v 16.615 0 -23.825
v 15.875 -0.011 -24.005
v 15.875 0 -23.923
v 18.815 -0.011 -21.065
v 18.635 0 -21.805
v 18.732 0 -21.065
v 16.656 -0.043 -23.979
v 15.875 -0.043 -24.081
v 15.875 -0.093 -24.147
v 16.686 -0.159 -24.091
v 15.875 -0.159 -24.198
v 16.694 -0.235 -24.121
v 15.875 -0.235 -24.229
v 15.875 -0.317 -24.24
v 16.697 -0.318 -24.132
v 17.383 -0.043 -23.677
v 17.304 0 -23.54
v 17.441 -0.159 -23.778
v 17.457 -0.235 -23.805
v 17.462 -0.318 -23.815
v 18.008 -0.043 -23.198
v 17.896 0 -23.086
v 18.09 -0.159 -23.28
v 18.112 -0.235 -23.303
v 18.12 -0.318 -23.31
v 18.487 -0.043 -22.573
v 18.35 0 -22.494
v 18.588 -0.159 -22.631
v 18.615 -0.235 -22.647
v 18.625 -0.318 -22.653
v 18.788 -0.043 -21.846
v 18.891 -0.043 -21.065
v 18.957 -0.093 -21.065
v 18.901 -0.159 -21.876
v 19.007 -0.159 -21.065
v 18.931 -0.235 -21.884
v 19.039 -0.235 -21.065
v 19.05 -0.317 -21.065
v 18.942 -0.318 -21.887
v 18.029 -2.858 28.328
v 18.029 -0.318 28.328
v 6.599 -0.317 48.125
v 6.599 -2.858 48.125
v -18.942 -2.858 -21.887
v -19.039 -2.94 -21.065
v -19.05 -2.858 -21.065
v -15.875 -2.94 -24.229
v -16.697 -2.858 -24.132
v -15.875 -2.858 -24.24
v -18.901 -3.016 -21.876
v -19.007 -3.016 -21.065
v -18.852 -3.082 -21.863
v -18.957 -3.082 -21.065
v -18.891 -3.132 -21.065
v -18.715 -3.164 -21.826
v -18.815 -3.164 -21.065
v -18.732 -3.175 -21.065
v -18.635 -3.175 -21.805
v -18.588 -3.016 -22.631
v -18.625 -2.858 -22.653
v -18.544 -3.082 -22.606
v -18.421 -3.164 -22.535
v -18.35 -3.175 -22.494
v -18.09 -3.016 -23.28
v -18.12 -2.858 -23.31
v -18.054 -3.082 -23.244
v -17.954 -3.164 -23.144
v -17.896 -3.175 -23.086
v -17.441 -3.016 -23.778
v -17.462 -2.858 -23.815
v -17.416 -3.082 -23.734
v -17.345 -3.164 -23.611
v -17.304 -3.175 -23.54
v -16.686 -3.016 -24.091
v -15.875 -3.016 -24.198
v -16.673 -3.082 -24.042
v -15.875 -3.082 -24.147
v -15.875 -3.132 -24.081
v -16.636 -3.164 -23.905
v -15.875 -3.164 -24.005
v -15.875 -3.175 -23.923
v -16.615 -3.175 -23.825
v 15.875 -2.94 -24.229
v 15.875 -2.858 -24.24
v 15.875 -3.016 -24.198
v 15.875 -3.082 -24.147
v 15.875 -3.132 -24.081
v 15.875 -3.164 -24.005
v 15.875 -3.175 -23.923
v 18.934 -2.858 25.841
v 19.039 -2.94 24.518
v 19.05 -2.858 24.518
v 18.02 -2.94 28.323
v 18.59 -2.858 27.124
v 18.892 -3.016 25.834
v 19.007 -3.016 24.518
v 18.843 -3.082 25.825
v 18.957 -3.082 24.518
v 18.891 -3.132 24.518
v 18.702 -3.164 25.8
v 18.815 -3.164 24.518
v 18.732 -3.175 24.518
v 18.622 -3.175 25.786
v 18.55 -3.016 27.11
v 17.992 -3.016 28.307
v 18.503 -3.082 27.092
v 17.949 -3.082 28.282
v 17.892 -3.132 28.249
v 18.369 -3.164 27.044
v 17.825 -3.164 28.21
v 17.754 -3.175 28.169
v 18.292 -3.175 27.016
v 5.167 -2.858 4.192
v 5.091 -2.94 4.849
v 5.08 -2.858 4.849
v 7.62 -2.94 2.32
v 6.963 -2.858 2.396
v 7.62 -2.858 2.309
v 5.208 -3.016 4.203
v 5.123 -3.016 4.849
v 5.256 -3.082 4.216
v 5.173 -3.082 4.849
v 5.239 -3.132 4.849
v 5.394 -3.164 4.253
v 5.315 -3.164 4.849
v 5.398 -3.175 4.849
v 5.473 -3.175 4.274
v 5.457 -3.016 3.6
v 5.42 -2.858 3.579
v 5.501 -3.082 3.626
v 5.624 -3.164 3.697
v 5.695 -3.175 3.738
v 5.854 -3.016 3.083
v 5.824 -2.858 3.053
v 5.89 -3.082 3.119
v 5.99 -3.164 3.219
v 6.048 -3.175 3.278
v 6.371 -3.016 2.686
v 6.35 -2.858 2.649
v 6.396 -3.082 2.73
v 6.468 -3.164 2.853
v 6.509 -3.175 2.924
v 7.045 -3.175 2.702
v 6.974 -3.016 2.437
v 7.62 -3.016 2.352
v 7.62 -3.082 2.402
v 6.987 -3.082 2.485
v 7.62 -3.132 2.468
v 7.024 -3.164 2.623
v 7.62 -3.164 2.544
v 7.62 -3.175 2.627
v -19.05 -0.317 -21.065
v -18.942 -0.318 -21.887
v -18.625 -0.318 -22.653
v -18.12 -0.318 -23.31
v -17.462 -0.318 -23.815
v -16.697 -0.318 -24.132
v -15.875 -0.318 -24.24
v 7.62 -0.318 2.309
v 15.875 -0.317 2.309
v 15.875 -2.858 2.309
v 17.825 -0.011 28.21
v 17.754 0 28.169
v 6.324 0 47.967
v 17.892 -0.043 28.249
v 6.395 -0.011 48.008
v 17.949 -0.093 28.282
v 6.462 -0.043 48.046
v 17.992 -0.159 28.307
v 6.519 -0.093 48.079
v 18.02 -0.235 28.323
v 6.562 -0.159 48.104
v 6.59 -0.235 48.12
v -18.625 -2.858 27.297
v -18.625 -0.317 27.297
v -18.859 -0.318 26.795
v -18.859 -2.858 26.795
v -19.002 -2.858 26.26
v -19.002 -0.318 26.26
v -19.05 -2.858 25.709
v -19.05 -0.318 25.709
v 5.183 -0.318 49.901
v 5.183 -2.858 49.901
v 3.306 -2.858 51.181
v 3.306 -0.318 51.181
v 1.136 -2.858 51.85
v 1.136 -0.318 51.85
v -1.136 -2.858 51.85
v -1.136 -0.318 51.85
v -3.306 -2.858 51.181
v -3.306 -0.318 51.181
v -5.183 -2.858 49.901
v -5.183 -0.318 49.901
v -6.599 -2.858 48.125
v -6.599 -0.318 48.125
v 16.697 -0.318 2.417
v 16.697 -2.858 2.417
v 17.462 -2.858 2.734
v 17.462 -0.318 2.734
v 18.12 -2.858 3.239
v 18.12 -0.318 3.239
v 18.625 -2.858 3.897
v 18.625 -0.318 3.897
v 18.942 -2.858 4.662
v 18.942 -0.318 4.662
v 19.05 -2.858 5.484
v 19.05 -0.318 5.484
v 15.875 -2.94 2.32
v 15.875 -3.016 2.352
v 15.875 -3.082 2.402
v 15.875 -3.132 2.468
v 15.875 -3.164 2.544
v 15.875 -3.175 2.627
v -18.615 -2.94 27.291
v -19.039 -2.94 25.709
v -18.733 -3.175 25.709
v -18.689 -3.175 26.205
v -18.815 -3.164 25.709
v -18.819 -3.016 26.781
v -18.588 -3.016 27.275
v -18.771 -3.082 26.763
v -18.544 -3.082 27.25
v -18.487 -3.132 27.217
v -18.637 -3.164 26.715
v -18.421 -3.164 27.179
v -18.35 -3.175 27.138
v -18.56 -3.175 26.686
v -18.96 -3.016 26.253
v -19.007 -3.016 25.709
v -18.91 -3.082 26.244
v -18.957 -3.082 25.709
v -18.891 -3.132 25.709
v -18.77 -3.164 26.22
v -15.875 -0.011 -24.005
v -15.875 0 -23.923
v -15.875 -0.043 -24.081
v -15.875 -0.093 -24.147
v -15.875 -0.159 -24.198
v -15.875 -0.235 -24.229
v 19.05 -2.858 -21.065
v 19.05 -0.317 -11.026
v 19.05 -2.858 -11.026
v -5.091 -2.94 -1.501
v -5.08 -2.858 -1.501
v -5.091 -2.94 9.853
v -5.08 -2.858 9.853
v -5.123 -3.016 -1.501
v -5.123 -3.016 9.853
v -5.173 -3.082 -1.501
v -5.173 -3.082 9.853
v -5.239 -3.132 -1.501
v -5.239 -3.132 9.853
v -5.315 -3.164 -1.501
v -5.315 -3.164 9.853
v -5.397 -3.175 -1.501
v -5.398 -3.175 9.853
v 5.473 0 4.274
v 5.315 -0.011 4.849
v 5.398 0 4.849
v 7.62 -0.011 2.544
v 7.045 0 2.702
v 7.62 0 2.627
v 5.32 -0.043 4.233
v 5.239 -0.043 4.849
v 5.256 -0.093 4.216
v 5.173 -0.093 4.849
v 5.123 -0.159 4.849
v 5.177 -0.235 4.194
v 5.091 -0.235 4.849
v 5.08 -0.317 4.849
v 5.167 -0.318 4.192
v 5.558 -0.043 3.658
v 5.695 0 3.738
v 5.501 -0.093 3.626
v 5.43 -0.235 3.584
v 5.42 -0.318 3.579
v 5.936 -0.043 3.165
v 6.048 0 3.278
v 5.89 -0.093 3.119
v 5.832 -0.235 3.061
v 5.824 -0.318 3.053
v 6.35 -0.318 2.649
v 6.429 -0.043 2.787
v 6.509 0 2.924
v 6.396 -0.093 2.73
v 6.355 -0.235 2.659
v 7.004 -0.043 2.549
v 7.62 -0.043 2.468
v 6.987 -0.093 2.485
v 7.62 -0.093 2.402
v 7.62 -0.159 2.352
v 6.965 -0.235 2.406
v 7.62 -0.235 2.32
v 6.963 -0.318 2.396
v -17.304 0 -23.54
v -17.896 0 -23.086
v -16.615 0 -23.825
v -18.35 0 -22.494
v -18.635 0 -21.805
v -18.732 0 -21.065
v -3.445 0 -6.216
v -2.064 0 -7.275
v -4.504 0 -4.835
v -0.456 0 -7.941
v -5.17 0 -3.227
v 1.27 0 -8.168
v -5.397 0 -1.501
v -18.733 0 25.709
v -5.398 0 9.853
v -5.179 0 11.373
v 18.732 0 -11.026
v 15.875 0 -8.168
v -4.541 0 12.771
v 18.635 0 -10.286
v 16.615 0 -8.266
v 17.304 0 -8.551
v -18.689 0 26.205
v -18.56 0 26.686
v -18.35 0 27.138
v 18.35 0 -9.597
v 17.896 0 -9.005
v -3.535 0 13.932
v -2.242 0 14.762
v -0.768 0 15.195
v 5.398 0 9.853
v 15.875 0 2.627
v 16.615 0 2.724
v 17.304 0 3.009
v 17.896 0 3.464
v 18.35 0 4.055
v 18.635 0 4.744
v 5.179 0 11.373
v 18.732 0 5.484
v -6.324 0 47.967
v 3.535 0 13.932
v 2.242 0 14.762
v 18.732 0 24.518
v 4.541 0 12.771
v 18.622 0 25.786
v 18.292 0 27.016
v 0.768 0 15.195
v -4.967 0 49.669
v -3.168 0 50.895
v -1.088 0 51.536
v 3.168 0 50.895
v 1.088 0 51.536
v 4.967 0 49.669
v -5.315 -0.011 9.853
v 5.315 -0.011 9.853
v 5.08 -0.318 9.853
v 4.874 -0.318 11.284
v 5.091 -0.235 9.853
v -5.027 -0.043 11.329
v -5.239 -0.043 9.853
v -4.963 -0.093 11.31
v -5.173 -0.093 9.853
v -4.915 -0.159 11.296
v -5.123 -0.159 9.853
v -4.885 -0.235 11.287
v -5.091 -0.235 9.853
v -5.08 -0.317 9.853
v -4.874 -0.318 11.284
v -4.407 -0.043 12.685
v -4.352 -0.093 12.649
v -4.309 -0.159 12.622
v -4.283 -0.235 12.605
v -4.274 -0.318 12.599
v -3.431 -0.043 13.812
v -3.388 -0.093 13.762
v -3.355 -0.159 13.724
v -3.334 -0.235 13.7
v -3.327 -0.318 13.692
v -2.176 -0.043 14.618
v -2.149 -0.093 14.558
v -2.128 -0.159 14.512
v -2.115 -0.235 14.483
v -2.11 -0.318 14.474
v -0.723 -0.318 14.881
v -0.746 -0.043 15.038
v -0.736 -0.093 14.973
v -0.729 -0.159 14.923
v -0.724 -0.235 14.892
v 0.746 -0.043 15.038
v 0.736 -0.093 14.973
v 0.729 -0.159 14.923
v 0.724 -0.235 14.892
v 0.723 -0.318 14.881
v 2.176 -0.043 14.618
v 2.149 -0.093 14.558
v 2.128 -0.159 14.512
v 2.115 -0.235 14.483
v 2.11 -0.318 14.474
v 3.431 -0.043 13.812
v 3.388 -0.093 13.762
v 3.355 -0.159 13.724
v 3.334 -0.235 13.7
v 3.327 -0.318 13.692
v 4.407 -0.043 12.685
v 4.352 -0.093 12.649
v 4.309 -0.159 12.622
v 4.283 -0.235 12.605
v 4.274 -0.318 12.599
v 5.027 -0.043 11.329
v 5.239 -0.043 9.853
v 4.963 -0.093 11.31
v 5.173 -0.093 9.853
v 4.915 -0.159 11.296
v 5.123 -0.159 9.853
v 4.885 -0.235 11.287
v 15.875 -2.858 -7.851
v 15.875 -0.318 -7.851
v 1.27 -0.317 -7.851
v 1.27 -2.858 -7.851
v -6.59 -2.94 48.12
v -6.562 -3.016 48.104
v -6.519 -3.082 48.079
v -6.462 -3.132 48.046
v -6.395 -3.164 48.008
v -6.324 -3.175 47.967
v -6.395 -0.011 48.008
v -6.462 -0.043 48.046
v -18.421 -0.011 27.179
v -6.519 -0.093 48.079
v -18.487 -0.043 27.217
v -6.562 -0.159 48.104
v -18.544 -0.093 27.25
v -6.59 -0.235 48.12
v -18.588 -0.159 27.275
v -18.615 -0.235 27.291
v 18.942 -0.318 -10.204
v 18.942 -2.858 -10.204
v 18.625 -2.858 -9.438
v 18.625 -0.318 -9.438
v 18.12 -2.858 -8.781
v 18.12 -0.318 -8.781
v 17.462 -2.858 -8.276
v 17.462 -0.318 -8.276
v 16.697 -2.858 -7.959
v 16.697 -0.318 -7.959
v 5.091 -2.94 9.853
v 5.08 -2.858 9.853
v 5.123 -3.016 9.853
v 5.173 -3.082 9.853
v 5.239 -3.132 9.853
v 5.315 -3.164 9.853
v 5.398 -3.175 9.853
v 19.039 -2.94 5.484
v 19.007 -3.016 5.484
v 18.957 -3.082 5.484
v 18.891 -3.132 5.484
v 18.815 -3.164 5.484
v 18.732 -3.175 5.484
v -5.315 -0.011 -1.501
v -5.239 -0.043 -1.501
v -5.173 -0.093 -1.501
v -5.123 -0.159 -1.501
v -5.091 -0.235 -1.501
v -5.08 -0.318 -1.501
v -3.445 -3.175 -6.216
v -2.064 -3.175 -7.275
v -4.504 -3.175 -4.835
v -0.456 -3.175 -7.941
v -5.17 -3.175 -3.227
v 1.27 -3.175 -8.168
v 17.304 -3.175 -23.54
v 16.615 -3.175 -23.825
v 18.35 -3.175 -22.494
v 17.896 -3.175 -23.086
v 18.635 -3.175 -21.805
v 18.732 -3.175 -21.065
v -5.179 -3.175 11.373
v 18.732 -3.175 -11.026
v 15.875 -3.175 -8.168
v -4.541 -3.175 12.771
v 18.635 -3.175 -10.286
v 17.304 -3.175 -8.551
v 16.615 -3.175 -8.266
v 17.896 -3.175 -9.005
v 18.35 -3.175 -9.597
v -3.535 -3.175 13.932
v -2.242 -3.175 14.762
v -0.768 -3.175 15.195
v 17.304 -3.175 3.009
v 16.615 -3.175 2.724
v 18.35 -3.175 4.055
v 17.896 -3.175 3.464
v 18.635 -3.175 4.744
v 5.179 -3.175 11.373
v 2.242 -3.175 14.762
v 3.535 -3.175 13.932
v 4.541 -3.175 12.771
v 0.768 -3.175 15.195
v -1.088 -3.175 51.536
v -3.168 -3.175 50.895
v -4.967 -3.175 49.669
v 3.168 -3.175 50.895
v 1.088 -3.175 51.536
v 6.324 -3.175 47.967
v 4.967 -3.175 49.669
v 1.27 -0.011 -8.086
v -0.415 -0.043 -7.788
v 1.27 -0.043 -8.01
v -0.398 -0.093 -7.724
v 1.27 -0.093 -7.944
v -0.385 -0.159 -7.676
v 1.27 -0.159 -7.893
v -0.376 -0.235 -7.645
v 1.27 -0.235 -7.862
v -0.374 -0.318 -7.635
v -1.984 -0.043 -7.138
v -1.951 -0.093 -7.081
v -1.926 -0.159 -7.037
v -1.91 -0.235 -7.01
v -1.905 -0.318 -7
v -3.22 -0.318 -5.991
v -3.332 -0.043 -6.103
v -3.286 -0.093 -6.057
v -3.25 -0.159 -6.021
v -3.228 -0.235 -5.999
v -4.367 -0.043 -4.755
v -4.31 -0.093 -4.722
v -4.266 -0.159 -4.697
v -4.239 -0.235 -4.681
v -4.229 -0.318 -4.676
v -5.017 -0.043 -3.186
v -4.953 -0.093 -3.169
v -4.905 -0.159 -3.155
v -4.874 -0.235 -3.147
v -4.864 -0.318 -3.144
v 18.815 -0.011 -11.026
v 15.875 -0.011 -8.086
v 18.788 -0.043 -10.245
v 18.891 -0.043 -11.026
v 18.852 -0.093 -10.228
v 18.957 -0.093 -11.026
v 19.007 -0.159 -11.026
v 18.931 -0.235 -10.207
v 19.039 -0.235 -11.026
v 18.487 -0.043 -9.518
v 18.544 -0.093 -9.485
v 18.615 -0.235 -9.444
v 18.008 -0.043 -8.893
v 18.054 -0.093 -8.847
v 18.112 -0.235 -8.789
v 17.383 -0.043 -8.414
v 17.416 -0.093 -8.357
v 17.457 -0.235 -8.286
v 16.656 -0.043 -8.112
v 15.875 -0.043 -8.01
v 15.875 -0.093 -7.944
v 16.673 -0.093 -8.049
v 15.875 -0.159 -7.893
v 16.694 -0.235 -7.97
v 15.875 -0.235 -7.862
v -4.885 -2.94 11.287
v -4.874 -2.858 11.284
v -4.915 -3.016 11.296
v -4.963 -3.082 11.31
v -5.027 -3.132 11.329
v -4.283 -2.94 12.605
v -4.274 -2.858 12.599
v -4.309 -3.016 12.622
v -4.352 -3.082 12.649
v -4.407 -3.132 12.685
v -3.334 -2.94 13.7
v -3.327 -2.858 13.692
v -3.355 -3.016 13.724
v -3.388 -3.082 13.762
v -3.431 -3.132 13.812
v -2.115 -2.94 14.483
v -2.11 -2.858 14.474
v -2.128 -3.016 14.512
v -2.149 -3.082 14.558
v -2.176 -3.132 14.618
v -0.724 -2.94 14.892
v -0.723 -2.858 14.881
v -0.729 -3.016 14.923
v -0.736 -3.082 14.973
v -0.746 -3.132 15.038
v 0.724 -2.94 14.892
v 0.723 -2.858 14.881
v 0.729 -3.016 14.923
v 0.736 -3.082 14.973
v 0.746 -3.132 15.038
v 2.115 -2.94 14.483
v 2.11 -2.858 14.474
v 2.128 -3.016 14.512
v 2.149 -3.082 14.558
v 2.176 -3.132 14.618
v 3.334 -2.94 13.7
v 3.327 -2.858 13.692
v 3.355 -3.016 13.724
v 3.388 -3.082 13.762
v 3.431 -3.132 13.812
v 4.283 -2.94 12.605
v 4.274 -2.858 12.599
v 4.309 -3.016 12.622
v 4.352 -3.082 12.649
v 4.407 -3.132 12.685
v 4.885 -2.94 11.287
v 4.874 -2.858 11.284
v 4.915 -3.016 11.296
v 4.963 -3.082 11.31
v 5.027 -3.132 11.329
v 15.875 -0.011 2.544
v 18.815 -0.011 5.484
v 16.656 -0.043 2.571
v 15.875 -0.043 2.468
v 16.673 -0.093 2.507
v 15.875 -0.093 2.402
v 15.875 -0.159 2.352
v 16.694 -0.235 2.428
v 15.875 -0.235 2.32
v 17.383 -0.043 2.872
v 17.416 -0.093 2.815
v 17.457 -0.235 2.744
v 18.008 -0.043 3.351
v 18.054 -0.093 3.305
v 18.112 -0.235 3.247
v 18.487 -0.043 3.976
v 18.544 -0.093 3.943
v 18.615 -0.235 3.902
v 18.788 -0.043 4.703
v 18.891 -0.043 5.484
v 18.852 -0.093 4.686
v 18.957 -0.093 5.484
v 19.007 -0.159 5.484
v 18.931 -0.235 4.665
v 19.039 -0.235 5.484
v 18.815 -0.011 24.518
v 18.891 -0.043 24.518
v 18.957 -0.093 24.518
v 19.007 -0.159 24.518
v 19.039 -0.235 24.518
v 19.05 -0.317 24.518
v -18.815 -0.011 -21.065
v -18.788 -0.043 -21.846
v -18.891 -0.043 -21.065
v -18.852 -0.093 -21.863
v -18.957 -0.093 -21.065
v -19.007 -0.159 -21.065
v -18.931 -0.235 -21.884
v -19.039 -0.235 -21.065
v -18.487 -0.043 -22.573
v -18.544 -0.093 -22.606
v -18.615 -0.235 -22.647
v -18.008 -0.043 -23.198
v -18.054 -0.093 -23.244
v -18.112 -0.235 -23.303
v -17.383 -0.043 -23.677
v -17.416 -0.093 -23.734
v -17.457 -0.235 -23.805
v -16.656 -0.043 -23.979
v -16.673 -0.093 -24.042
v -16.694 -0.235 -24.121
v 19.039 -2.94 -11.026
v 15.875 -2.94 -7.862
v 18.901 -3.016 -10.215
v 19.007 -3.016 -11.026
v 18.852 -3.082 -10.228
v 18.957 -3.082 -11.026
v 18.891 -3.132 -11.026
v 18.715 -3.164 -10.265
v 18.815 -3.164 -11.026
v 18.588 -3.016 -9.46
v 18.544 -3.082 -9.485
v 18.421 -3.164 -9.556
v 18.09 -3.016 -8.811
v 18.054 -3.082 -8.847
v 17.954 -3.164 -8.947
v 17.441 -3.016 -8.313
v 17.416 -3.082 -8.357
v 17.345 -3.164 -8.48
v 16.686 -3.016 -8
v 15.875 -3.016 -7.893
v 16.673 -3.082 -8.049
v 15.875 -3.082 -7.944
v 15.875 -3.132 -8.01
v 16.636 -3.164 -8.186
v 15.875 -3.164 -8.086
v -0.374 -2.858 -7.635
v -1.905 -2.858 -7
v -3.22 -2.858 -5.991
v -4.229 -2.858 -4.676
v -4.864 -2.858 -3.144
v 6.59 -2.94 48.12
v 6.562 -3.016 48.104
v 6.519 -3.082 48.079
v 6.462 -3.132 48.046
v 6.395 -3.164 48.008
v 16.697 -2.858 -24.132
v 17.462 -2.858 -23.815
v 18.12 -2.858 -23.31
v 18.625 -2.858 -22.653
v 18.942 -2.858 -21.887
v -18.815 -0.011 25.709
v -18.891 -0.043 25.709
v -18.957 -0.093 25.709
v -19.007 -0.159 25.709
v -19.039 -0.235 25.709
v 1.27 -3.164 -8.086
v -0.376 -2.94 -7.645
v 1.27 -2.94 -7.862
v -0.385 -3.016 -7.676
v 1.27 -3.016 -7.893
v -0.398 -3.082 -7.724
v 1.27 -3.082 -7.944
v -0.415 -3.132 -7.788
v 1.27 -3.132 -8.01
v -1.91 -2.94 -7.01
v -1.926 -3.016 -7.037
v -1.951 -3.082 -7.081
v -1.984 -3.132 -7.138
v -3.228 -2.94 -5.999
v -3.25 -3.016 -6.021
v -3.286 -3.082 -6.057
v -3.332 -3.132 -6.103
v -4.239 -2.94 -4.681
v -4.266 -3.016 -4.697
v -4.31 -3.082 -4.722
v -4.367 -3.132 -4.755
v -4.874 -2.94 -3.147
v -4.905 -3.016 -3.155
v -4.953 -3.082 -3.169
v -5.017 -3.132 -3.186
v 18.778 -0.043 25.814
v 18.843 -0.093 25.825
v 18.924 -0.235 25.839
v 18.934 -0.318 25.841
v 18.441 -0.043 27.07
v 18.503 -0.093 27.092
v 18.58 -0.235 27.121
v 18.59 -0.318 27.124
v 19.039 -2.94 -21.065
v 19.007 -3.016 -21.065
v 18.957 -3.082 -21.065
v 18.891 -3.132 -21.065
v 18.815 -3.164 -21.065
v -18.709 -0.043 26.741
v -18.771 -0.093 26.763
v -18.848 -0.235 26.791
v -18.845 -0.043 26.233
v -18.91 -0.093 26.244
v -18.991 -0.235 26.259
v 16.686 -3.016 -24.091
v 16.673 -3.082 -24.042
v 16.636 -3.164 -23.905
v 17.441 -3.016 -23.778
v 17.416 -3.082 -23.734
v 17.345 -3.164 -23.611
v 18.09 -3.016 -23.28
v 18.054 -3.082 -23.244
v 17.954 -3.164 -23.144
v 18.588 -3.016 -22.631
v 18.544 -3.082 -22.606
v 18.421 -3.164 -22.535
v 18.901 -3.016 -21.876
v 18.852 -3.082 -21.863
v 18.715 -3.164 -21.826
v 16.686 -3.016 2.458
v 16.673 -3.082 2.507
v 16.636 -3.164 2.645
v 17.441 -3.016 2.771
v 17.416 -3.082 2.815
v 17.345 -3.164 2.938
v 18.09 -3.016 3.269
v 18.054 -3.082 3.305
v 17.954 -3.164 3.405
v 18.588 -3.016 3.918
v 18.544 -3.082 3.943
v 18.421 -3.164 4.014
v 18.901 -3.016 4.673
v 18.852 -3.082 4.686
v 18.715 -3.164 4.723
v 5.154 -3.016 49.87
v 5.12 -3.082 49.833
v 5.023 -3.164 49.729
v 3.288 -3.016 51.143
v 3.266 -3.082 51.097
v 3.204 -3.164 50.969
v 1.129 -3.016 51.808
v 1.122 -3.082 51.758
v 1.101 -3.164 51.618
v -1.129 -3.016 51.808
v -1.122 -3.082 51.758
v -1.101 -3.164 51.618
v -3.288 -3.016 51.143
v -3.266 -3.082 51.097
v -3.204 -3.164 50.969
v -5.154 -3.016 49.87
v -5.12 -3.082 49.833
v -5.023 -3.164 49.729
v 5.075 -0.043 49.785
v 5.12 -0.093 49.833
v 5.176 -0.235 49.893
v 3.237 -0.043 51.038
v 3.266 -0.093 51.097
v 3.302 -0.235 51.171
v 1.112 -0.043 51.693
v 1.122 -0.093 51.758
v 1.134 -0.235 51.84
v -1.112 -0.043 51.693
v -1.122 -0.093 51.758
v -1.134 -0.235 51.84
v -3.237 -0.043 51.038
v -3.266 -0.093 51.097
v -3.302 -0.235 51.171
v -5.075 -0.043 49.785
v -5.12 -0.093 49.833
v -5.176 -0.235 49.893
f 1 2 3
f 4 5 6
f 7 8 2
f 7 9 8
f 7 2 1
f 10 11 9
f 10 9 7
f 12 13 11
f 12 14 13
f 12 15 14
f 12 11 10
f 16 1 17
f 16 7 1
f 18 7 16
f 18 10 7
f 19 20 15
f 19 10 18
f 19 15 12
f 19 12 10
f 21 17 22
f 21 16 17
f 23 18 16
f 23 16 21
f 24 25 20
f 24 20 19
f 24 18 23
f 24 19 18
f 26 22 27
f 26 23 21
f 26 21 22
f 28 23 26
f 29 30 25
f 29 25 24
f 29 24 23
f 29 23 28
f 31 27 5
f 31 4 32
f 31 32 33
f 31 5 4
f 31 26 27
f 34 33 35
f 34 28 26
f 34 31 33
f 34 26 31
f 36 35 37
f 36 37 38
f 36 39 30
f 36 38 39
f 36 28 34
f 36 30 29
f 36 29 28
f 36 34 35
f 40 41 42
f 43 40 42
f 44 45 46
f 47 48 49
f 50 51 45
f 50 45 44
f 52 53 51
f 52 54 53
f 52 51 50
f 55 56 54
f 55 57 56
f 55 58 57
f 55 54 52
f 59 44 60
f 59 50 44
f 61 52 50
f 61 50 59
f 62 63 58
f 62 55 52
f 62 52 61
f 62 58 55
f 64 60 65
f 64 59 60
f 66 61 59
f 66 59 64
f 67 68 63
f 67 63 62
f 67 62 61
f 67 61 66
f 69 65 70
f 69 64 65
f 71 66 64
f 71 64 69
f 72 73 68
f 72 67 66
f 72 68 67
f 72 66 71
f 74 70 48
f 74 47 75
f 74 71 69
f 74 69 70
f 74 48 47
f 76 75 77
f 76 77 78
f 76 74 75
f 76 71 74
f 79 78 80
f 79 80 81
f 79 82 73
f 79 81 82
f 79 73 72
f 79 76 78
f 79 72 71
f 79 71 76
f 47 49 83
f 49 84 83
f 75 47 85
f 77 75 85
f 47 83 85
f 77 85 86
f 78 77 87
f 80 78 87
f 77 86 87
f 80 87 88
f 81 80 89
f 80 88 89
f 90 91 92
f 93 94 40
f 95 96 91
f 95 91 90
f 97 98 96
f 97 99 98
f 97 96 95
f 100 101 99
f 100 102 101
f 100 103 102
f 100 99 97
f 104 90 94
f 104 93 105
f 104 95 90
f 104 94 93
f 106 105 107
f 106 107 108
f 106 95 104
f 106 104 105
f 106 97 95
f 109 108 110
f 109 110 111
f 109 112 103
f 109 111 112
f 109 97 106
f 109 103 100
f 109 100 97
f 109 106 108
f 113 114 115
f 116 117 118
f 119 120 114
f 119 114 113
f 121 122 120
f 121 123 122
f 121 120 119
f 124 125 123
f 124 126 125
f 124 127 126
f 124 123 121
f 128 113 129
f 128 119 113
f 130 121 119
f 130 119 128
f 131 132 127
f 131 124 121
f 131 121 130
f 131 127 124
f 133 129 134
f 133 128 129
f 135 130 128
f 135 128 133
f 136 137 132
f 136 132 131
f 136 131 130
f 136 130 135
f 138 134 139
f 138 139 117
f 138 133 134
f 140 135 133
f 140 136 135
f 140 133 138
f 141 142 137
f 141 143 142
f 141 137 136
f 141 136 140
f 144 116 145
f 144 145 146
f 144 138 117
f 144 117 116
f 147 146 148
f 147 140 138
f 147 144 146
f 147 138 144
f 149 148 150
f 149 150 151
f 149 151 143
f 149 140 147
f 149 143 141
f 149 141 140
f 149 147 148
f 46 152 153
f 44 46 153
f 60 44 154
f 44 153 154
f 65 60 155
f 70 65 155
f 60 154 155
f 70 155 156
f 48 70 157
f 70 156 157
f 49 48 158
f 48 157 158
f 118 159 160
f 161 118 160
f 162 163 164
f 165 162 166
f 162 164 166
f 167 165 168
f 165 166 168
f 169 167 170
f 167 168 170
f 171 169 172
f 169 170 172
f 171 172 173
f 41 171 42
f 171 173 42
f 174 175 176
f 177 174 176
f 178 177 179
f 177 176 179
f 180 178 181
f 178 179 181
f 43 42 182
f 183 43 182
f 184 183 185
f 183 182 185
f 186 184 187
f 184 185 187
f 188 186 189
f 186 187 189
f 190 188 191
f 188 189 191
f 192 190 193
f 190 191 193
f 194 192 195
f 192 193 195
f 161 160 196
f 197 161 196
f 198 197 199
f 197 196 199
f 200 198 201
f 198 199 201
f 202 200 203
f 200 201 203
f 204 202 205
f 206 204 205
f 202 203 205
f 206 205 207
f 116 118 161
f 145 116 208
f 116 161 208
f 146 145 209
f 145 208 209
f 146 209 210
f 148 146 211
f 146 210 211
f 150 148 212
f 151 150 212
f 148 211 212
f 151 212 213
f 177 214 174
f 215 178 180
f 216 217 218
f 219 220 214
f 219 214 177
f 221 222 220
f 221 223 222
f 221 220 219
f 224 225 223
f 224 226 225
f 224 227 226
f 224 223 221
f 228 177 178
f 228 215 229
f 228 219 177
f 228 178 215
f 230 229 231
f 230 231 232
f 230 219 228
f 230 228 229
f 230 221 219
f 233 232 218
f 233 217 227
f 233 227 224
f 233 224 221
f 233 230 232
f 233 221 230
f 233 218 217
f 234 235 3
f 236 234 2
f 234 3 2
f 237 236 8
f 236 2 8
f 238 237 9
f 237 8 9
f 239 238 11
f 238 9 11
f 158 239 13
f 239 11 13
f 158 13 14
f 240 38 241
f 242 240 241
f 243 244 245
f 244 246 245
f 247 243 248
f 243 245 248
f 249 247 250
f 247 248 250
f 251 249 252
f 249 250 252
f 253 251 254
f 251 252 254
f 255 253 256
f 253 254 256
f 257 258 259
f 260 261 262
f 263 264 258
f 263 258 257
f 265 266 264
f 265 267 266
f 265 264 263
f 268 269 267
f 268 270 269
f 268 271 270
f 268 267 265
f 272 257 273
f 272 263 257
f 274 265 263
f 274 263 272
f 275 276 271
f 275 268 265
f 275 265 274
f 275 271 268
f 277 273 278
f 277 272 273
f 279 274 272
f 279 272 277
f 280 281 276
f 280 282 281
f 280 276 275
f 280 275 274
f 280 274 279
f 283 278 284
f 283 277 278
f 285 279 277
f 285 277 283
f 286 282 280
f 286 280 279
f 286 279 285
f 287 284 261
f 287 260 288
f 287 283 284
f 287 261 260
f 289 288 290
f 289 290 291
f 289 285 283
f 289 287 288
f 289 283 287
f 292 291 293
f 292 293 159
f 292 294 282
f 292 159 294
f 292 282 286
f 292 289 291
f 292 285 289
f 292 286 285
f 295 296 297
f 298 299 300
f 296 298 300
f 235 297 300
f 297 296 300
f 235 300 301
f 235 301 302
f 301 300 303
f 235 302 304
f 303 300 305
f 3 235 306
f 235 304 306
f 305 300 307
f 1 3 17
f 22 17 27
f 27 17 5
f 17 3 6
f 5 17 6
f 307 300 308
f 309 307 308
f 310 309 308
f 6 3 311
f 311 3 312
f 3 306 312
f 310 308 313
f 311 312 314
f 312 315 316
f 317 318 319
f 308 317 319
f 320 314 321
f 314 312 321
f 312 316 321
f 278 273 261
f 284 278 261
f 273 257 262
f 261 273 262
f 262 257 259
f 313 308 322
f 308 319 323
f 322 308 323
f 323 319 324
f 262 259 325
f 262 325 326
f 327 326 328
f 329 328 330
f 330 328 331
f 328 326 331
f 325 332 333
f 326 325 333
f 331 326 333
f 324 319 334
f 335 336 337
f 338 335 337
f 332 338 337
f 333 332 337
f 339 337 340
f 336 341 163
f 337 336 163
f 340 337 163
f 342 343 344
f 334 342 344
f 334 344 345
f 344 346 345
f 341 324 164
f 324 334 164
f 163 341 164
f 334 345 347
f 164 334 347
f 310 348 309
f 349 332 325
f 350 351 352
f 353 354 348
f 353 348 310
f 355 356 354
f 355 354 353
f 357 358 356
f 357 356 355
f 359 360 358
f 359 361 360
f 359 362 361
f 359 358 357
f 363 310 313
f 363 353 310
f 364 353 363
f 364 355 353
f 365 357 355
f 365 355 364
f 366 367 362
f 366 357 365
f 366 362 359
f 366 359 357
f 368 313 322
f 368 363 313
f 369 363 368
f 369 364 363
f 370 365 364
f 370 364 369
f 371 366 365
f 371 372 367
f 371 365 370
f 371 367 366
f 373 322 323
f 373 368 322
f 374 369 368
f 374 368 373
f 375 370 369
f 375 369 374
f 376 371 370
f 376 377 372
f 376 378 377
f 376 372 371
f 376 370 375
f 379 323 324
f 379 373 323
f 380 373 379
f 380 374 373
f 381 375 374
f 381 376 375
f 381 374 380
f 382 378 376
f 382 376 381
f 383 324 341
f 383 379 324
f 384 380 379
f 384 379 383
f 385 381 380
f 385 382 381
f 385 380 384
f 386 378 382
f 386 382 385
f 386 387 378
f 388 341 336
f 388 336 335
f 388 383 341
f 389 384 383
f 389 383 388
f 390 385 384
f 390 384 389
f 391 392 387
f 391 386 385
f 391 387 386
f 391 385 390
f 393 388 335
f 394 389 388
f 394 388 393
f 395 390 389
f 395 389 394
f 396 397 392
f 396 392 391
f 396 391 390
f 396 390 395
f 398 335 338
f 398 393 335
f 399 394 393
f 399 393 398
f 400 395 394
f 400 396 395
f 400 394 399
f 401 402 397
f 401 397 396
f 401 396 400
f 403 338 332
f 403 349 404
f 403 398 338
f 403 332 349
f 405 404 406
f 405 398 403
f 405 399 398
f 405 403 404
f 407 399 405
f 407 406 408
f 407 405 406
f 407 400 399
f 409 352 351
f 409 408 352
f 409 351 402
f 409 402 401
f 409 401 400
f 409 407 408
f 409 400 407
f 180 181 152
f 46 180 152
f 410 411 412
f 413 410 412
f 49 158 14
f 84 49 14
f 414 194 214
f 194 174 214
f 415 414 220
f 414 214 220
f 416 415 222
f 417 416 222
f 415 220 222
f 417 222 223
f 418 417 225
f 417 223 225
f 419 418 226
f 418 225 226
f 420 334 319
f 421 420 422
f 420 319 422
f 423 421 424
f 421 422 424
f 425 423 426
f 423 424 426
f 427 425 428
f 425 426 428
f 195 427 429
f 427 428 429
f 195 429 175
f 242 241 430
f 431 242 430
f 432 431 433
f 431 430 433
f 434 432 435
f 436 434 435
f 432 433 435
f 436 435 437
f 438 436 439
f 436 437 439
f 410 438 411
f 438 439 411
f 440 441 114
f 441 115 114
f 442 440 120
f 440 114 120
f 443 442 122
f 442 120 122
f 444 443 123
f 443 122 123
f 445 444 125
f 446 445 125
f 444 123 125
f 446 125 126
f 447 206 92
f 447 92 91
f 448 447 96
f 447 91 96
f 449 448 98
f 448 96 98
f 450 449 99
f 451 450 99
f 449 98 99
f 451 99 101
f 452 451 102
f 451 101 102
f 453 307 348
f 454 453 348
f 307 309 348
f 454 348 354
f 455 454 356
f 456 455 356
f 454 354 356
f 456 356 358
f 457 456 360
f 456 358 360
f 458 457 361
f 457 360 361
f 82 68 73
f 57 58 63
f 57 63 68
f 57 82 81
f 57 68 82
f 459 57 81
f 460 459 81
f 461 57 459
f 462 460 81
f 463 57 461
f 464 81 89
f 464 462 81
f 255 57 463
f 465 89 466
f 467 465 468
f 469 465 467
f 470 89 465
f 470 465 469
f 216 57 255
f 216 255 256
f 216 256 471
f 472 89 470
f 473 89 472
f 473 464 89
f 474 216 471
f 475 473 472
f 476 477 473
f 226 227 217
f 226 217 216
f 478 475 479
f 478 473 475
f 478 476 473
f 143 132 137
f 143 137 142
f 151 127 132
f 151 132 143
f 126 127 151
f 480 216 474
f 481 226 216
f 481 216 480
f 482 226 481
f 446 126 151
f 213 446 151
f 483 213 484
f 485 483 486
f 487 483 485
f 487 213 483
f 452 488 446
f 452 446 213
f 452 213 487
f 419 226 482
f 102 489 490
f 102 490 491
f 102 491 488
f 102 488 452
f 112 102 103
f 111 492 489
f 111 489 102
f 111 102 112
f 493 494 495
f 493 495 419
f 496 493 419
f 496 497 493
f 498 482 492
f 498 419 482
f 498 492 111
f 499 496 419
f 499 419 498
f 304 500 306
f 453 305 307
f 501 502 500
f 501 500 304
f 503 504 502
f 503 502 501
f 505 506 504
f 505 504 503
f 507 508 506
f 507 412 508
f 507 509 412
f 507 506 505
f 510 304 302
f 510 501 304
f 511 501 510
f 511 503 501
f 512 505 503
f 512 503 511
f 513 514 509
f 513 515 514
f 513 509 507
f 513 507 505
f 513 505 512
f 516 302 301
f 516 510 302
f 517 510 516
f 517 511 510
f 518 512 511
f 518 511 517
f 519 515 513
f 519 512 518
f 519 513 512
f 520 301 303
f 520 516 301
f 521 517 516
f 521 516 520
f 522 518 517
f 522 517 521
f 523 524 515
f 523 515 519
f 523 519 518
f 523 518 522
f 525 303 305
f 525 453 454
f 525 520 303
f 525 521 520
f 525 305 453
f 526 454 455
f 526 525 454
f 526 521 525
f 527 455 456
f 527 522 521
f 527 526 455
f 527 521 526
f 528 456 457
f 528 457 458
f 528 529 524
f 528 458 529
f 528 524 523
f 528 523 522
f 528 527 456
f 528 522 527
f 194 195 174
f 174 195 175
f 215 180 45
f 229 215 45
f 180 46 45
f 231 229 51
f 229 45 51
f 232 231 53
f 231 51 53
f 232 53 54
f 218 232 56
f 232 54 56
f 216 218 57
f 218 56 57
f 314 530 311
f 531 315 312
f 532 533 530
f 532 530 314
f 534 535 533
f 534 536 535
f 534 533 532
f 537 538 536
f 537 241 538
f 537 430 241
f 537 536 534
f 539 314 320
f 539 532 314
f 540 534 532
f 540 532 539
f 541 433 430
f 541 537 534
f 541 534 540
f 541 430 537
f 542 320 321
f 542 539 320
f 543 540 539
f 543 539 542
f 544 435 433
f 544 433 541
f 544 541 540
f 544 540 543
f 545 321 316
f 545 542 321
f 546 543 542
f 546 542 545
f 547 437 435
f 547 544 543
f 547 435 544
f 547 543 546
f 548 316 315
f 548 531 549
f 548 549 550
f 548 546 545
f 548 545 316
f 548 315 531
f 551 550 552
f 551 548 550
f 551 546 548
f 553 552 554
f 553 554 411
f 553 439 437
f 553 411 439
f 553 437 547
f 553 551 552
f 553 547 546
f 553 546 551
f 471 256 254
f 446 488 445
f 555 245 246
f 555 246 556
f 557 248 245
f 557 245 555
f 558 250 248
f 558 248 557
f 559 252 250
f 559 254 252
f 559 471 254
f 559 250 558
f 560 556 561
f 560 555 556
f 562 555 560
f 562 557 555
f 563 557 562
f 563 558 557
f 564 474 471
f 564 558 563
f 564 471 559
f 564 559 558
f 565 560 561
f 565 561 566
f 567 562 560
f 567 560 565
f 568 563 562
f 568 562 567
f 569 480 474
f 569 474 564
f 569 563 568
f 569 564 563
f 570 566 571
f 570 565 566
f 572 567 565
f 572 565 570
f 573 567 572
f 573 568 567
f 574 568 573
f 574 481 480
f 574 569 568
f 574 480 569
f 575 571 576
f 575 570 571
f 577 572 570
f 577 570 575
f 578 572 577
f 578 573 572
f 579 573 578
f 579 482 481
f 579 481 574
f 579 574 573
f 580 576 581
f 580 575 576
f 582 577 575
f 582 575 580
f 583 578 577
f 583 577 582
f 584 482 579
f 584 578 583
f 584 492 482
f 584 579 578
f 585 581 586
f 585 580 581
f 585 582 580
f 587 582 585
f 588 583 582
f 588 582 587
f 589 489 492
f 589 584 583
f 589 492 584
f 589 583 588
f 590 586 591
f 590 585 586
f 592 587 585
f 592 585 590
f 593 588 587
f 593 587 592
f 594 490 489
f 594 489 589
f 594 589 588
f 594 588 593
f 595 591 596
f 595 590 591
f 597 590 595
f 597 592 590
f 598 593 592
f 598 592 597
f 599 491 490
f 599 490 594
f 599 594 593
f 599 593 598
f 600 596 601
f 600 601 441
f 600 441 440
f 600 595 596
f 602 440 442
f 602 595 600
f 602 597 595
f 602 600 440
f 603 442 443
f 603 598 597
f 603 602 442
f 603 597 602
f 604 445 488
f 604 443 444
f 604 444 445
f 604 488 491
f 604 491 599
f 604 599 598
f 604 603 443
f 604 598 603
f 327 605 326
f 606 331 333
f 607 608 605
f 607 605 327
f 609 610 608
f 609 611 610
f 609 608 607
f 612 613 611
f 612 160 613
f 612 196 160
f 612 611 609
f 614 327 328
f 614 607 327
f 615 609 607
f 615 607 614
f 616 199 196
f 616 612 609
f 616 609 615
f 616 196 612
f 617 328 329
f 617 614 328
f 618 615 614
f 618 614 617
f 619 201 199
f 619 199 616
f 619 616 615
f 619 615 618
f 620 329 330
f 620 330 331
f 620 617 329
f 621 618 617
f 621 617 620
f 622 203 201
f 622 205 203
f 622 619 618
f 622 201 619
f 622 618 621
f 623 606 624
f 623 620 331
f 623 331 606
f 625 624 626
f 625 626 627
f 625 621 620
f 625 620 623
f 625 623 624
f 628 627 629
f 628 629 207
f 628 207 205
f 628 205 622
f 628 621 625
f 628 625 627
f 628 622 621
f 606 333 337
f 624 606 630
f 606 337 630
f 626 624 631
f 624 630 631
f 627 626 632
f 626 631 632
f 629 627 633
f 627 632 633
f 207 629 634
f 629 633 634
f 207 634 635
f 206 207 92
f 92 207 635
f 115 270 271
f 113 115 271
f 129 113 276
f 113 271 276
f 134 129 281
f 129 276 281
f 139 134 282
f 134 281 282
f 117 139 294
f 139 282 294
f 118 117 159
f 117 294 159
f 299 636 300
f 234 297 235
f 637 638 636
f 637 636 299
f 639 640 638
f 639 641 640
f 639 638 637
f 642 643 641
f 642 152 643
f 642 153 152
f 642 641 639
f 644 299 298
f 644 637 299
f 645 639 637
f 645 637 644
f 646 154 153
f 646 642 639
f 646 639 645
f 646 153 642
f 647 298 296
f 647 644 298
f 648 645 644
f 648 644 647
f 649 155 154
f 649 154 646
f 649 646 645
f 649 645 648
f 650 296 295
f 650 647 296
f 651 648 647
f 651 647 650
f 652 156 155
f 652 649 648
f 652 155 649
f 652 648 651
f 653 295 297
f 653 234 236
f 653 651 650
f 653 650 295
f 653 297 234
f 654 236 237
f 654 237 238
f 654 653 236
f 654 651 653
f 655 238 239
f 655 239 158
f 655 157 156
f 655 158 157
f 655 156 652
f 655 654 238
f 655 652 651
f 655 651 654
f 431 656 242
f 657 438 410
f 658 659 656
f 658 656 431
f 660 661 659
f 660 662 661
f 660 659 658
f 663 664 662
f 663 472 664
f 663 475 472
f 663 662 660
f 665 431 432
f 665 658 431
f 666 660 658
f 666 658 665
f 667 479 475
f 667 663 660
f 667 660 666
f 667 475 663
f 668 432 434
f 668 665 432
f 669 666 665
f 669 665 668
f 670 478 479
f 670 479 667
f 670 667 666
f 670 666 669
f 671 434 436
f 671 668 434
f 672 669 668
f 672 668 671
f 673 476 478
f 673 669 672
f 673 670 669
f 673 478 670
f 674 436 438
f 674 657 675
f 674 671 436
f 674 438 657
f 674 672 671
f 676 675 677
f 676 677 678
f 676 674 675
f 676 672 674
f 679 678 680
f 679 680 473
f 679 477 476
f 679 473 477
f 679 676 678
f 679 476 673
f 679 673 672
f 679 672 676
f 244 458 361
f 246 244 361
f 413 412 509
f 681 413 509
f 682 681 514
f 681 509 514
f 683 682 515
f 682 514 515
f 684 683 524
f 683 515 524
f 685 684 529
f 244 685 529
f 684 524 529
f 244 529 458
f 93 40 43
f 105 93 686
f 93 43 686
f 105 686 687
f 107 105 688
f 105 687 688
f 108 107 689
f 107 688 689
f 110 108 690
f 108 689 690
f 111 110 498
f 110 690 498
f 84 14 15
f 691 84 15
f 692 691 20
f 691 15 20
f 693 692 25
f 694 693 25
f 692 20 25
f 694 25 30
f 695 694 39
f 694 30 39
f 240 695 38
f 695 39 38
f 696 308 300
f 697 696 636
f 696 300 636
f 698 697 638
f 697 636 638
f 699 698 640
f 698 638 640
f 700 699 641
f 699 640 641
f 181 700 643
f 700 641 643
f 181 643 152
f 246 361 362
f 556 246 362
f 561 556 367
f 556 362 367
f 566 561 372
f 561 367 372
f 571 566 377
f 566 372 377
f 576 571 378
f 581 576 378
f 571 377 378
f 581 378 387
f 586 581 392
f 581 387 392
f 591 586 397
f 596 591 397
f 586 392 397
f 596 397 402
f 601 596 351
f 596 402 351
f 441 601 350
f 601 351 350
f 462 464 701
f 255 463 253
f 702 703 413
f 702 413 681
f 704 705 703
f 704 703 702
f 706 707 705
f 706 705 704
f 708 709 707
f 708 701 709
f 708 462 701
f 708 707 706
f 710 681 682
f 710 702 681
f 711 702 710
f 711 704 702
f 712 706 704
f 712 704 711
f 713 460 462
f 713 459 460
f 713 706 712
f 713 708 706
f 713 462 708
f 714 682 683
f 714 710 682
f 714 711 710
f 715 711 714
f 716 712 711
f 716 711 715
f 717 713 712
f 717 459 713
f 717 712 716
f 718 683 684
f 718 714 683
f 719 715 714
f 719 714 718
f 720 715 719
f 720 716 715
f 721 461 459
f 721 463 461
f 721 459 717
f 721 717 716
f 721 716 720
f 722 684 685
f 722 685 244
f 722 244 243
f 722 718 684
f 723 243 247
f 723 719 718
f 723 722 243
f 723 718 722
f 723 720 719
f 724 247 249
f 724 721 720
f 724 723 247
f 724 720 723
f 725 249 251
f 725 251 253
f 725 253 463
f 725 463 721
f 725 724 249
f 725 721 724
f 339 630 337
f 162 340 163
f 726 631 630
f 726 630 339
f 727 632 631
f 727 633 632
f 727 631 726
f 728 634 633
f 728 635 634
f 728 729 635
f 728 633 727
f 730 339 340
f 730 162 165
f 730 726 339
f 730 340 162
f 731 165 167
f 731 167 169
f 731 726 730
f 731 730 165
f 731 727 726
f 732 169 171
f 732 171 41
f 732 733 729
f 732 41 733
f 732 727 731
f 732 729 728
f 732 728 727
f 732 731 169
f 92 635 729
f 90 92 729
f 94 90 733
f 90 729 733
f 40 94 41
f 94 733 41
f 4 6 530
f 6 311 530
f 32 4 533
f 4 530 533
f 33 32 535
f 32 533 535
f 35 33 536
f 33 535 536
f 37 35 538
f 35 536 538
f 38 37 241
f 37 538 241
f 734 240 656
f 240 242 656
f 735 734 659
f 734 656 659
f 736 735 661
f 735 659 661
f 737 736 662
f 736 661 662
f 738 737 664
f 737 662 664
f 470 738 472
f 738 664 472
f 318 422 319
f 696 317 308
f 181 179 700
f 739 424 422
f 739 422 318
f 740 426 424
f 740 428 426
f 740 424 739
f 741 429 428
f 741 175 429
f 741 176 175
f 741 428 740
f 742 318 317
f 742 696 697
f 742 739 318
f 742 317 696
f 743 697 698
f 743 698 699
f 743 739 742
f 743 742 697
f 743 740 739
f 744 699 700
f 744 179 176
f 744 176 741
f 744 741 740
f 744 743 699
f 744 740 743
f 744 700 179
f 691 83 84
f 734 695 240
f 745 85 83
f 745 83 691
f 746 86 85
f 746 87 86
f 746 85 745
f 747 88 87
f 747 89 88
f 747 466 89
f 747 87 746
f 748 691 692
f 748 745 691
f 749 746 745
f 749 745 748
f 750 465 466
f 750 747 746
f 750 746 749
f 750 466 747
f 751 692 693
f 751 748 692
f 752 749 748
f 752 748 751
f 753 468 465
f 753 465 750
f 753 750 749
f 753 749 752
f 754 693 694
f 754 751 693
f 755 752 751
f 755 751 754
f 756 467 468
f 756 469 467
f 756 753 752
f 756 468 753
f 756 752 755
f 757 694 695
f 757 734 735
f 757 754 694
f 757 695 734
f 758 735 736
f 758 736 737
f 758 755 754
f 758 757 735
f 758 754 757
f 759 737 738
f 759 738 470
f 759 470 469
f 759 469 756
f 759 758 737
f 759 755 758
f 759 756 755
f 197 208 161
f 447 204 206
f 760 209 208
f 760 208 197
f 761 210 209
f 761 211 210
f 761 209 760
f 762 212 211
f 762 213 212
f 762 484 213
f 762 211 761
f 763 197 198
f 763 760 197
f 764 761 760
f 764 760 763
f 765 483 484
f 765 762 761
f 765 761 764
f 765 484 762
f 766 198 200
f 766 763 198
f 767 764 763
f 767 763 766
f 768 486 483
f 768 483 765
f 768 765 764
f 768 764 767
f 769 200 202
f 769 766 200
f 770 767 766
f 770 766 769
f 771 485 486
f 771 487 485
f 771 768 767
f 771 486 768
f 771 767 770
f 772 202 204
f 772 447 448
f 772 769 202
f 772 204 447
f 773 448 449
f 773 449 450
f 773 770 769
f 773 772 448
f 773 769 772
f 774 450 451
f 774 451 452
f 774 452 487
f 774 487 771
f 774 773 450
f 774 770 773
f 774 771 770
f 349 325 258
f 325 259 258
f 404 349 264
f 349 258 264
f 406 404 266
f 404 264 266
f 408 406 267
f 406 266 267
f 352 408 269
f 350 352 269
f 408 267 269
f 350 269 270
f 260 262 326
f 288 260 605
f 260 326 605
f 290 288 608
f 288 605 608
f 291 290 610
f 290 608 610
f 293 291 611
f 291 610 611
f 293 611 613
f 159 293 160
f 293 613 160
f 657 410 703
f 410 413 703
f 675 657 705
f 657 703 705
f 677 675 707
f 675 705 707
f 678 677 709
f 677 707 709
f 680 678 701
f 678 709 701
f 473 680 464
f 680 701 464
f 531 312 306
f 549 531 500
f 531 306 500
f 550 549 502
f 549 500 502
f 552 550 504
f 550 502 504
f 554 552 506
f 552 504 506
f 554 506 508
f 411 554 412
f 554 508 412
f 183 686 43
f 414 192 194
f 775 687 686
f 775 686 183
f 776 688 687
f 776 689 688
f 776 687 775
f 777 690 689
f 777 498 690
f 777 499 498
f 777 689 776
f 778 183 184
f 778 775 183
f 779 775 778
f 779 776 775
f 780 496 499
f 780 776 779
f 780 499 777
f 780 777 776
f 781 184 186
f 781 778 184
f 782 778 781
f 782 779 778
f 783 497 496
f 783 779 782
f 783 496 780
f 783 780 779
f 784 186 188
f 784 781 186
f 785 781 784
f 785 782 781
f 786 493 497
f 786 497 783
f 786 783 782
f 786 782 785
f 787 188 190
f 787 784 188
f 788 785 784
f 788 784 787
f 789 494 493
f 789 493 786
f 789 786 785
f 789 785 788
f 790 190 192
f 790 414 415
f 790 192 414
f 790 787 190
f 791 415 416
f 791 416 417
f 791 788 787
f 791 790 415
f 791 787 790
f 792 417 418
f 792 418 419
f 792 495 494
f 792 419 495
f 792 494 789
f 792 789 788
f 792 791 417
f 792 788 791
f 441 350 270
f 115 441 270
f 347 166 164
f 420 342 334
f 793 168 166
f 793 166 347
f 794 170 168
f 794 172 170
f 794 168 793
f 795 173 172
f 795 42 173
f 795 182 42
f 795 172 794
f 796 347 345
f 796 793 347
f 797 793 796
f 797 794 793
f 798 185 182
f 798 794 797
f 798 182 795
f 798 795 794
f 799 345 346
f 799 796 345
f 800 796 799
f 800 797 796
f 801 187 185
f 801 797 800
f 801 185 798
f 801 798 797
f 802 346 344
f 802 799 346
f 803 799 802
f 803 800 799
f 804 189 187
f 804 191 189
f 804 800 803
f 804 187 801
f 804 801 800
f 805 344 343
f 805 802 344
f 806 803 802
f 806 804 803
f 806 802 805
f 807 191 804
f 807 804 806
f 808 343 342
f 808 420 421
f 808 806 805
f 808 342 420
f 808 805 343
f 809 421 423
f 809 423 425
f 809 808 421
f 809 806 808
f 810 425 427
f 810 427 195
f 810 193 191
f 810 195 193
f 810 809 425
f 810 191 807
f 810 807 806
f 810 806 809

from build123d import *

# Parameters (mm, degrees)
F1_DEPTH = 3.175
F2_R     = 0.3175
F3_R     = 0.3175


with BuildPart() as f1:
    # F0 (on Front) → F1 (new body)
    with BuildSketch(Plane.XZ):
        with BuildLine():
            ThreePointArc((-19.05, -21.065116), (-18.120064, -23.31018), (-15.875, -24.240116))
            Line((-15.875, -24.240116), (15.875, -24.240116))
            ThreePointArc((15.875, -24.240116), (18.120064, -23.31018), (19.05, -21.065116))
            Line((19.05, -21.065116), (19.05, -11.025942))
            ThreePointArc((19.05, -11.025942), (18.120064, -8.780878), (15.875, -7.850942))
            Line((15.875, -7.850942), (1.27, -7.850942))
            ThreePointArc((1.27, -7.850942), (-3.220128, -5.99107), (-5.08, -1.500942))
            Line((-5.08, -1.500942), (-5.08, 9.852602))
            ThreePointArc((-5.08, 9.852602), (0, 14.932602), (5.08, 9.852602))
            Line((5.08, 9.852602), (5.08, 4.849058))
            ThreePointArc((5.08, 4.849058), (5.823949, 3.053007), (7.62, 2.309058))
            Line((7.62, 2.309058), (15.875, 2.309058))
            ThreePointArc((15.875, 2.309058), (18.120064, 3.238994), (19.05, 5.484058))
            Line((19.05, 5.484058), (19.05, 24.518112))
            ThreePointArc((19.05, 24.518112), (18.790355, 26.490313), (18.029114, 28.328112))
            Line((18.029114, 28.328112), (6.599114, 48.125452))
            ThreePointArc((6.599114, 48.125452), (0, 51.935452), (-6.599114, 48.125452))
            Line((-6.599114, 48.125452), (-18.624631, 27.296646))
            ThreePointArc((-18.624631, 27.296646), (-18.941814, 26.530896), (-19.05, 25.709146))
            Line((-19.05, 25.709146), (-19.05, -21.065116))
        make_face()
    extrude(amount=F1_DEPTH)

    # F2
    f2_edges = [f1.edges().sort_by_distance(p)[0] for p in [
        (19.05, -3.175, -16.045529),
        (18.120064, -3.175, -8.780878),
        (8.5725, -3.175, -7.850942),
        (-3.220128, -3.175, -5.99107),
        (-5.08, -3.175, 4.17583),
        (0, -3.175, 14.932602),
        (5.08, -3.175, 7.35083),
        (5.823949, -3.175, 3.053007),
        (11.7475, -3.175, 2.309058),
        (18.120064, -3.175, 3.238994),
        (19.05, -3.175, 15.001085),
        (18.790355, -3.175, 26.490313),
        (12.314114, -3.175, 38.226782),
        (0, -3.175, 51.935452),
        (-12.611872, -3.175, 37.711049),
        (-18.941814, -3.175, 26.530896),
        (-19.05, -3.175, 2.322015),
        (-18.120064, -3.175, -23.31018),
        (0, -3.175, -24.240116),
        (18.120064, -3.175, -23.31018),
    ]]
    fillet(f2_edges, radius=F2_R)

    # F3
    f3_edges = [f1.edges().sort_by_distance(p)[0] for p in [
        (19.05, 0, -16.045529),
        (18.120064, 0, -8.780878),
        (8.5725, 0, -7.850942),
        (-3.220128, 0, -5.99107),
        (-5.08, 0, 4.17583),
        (0, 0, 14.932602),
        (5.08, 0, 7.35083),
        (5.823949, 0, 3.053007),
        (11.7475, 0, 2.309058),
        (18.120064, 0, 3.238994),
        (19.05, 0, 15.001085),
        (18.790355, 0, 26.490313),
        (12.314114, 0, 38.226782),
        (0, 0, 51.935452),
        (-12.611872, 0, 37.711049),
        (-18.941814, 0, 26.530896),
        (-19.05, 0, 2.322015),
        (-18.120064, 0, -23.31018),
        (0, 0, -24.240116),
        (18.120064, 0, -23.31018),
    ]]
    fillet(f3_edges, radius=F3_R)


solid = f1.part
